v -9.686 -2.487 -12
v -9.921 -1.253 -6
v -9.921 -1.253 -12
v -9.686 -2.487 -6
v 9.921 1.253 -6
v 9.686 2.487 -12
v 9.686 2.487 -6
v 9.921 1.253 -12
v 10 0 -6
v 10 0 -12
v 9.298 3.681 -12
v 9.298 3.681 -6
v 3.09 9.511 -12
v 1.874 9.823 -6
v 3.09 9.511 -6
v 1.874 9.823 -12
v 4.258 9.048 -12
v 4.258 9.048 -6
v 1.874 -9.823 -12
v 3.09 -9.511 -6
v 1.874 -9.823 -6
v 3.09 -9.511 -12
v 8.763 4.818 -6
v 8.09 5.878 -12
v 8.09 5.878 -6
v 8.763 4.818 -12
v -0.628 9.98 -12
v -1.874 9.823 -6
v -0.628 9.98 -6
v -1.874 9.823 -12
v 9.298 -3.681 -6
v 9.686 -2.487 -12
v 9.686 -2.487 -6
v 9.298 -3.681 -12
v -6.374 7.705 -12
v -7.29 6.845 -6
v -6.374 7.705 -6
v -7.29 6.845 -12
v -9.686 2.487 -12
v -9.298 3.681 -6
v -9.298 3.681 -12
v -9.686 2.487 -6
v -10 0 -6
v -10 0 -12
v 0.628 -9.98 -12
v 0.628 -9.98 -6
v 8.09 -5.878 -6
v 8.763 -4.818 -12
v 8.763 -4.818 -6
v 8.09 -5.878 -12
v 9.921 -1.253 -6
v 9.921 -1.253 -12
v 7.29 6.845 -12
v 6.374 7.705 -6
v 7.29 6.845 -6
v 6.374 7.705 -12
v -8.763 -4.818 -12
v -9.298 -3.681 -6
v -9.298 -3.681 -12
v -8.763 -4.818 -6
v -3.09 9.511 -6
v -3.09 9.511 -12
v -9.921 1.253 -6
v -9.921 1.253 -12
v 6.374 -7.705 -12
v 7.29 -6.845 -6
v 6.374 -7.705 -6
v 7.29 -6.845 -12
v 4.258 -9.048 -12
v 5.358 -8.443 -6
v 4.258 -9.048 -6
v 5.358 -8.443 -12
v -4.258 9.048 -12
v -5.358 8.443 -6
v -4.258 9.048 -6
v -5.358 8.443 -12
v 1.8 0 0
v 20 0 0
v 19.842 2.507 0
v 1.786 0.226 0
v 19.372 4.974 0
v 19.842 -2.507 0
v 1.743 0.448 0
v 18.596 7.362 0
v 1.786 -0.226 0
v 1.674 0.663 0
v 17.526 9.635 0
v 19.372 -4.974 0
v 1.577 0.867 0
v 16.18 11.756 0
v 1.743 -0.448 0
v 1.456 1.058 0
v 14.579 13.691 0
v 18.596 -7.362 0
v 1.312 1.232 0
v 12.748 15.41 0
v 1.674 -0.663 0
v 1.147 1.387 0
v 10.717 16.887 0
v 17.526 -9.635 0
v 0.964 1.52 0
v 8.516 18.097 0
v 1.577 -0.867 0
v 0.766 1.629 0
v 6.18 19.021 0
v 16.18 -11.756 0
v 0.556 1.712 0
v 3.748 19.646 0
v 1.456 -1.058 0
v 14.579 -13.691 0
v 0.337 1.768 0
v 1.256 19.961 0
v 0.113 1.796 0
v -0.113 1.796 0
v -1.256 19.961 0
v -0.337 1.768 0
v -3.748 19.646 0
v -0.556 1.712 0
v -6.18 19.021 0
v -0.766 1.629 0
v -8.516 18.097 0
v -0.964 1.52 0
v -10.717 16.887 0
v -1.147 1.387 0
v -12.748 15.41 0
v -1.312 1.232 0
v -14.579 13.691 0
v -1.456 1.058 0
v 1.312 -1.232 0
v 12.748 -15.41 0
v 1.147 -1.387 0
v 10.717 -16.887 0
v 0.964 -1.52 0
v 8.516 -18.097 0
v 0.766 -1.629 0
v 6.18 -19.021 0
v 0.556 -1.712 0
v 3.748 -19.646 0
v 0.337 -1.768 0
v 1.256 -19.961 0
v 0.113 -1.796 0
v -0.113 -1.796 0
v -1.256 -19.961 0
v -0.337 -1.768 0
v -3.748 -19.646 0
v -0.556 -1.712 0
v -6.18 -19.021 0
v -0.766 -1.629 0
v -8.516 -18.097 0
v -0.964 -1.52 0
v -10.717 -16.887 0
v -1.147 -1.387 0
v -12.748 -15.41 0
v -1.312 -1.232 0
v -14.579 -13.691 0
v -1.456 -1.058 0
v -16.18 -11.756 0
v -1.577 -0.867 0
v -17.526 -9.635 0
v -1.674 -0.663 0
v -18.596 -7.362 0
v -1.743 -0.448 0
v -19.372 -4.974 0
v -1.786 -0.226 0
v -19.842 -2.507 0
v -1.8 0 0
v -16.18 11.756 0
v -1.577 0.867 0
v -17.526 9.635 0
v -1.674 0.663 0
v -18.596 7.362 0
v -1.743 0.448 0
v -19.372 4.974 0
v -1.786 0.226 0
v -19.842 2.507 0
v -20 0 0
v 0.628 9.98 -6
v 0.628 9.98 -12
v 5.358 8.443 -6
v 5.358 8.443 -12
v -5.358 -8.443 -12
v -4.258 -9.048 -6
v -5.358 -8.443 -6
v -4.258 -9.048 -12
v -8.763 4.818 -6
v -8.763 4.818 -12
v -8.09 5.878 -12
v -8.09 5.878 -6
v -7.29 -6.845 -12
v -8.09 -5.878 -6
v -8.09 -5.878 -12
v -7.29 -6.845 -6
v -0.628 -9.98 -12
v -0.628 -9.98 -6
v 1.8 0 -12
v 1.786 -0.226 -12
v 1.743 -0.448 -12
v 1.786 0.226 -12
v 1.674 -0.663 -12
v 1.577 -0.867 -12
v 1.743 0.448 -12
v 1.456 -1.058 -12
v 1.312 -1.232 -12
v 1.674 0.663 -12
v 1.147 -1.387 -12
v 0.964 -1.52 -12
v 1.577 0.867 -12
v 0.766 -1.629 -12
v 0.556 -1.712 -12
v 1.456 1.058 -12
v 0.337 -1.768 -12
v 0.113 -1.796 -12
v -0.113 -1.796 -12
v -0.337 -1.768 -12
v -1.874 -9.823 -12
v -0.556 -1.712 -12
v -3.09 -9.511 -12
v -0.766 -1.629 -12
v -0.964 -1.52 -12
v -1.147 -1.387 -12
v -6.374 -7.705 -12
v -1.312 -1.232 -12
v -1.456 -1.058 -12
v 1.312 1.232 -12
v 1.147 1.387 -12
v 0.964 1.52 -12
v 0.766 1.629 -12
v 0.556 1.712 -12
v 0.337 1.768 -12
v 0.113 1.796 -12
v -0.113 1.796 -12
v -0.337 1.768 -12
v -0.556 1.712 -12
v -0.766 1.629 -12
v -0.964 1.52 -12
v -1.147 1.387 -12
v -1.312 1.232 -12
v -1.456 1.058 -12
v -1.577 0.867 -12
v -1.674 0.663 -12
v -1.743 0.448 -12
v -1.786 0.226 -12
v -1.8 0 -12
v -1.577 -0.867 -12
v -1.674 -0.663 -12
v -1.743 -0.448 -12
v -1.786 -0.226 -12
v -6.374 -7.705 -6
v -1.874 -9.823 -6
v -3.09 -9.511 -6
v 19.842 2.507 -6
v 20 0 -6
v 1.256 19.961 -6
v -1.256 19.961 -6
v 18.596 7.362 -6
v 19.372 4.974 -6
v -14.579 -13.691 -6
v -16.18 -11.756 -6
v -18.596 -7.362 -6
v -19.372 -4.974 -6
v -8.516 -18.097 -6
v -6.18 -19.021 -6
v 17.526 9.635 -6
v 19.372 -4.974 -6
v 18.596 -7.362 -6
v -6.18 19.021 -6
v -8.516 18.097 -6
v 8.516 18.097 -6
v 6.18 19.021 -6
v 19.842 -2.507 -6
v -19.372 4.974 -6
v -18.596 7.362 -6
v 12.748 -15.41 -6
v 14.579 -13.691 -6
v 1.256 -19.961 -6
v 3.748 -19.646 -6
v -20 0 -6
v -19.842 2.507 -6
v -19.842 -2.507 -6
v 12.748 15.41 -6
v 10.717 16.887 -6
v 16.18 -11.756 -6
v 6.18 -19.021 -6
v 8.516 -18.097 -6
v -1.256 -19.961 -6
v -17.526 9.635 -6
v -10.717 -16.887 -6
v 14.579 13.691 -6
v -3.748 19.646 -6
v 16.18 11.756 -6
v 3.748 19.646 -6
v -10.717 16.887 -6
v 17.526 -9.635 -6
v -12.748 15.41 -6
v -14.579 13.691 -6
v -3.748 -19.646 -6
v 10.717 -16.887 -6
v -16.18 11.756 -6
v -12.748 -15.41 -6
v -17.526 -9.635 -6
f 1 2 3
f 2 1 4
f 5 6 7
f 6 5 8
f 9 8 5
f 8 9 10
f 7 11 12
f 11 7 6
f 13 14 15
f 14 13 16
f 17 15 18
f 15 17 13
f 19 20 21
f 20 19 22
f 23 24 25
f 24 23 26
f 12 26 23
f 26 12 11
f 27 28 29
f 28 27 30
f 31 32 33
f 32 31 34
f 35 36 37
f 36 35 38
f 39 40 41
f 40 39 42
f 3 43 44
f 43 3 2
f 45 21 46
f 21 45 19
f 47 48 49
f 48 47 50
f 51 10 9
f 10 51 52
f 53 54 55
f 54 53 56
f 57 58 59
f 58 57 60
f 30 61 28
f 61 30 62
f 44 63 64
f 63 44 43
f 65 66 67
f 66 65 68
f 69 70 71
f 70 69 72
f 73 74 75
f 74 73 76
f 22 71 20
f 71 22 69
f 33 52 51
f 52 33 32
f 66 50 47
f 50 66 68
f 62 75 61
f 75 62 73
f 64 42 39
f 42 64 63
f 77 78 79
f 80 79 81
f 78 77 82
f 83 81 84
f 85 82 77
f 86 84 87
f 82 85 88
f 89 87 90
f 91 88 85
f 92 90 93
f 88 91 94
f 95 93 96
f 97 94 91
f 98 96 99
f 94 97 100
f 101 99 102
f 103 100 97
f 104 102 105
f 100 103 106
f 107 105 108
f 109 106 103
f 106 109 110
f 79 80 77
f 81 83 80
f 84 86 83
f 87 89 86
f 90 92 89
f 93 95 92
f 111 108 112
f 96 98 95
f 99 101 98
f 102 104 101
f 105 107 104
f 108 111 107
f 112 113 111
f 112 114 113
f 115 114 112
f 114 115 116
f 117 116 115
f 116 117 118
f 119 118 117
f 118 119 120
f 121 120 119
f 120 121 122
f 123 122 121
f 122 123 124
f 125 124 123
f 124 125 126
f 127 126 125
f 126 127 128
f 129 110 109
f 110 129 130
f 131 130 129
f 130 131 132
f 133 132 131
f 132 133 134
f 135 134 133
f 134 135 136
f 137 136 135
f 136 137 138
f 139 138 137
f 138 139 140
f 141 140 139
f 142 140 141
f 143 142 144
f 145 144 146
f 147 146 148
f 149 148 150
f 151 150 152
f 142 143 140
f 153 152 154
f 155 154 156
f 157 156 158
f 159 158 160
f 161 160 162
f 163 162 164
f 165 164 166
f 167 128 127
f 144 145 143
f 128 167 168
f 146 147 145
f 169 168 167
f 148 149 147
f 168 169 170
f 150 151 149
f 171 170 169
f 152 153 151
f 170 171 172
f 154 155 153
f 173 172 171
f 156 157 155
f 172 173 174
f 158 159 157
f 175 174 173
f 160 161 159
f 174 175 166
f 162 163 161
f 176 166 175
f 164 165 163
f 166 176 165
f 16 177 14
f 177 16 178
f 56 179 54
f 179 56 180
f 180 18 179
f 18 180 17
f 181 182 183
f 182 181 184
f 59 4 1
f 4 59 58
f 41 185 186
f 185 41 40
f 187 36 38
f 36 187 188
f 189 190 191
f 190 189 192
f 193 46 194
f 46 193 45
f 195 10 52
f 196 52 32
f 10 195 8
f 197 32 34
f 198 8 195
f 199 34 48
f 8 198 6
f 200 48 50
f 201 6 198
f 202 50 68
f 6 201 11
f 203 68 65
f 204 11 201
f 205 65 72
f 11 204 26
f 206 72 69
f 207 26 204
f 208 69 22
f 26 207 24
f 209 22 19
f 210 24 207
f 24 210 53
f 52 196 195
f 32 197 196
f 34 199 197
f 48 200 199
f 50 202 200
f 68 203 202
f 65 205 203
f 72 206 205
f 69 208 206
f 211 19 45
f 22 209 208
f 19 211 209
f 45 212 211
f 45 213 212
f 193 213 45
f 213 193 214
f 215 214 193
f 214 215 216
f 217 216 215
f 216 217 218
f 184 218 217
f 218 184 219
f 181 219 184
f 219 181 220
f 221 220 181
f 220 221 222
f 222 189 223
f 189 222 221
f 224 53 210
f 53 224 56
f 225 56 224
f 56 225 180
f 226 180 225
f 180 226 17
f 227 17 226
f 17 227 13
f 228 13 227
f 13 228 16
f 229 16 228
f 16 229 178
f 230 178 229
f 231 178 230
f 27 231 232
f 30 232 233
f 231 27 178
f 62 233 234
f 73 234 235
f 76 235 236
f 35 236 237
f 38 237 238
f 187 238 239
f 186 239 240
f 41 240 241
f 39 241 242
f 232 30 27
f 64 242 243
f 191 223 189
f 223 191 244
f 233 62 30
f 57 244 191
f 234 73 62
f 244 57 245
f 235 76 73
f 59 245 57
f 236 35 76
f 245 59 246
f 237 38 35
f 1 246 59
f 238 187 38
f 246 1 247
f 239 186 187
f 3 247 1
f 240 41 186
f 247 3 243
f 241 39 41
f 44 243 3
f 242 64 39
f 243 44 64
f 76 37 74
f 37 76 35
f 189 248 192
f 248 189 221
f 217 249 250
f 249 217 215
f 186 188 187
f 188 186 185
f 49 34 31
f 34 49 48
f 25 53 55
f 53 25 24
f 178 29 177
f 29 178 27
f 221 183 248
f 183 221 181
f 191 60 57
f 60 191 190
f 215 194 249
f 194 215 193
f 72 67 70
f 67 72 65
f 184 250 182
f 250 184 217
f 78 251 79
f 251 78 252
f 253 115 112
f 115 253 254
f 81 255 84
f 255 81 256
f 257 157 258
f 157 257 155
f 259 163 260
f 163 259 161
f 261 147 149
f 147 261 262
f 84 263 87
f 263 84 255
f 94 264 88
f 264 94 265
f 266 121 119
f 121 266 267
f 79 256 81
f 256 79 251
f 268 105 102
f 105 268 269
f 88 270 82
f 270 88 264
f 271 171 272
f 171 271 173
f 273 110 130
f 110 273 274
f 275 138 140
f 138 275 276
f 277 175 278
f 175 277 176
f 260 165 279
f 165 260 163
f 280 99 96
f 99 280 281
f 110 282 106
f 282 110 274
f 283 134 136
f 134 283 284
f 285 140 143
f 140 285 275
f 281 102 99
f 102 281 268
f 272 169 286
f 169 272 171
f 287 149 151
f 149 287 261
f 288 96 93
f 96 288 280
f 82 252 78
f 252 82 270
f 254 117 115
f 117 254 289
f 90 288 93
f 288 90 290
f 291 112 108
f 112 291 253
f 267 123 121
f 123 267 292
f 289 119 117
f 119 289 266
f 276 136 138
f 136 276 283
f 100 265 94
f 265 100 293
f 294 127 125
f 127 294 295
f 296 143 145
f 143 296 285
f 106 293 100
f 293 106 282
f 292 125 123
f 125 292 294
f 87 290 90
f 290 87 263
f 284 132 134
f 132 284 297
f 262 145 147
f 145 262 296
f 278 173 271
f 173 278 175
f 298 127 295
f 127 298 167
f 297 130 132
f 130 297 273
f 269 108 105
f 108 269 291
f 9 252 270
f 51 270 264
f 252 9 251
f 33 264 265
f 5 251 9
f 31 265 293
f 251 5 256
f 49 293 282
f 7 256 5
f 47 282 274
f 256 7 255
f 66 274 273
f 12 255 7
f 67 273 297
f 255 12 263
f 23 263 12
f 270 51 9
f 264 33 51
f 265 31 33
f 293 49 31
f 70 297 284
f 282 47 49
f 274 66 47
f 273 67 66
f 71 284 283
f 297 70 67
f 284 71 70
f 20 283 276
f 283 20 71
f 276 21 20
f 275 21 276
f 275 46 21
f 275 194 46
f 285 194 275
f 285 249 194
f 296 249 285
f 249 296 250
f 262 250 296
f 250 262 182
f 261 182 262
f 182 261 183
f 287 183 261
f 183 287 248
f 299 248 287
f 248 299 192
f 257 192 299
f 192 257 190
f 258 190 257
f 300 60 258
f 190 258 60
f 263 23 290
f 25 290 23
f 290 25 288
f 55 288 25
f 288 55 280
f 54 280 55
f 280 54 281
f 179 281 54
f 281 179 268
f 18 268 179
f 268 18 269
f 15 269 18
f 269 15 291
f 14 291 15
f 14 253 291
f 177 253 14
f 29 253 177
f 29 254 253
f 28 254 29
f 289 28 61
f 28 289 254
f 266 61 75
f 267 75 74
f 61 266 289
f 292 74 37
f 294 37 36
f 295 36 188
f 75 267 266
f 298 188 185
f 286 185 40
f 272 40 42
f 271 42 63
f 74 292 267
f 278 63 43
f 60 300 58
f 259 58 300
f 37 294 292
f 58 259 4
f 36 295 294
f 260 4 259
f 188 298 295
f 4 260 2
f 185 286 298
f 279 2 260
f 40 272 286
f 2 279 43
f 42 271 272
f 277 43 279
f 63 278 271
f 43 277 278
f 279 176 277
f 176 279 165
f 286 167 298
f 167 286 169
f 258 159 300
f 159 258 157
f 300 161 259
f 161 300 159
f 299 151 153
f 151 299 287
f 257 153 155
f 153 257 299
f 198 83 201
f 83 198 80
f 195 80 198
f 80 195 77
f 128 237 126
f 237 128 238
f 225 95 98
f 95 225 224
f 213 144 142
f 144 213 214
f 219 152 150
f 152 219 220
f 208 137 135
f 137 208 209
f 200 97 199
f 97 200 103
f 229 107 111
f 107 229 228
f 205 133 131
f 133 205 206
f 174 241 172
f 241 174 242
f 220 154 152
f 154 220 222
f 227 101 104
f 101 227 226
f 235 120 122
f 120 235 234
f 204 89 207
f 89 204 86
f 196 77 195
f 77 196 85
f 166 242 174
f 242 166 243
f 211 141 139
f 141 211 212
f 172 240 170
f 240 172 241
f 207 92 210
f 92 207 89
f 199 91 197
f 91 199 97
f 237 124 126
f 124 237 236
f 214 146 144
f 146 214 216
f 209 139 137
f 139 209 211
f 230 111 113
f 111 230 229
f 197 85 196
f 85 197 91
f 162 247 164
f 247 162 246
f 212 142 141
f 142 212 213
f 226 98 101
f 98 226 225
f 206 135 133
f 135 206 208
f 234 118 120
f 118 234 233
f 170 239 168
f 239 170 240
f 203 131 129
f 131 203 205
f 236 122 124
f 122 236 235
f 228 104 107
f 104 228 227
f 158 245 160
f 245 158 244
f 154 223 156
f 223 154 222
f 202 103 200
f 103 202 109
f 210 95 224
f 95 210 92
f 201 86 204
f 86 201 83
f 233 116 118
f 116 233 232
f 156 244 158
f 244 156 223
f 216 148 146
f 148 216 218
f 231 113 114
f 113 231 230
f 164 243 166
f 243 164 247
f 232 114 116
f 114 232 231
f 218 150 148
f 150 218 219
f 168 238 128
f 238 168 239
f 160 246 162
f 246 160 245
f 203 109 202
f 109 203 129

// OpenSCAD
$fn = 50;


difference() {
	union() {
		translate(v = [0, 0, -12.0000000000]) {
			cylinder(h = 12, r = 10.0000000000);
		}
		translate(v = [0, 0, -6.0000000000]) {
			cylinder(h = 6, r = 20.0000000000);
		}
	}
	union() {
		#translate(v = [0, 0, -12]) {
			cylinder(h = 12, r = 1.8000000000);
		}
	}
}
